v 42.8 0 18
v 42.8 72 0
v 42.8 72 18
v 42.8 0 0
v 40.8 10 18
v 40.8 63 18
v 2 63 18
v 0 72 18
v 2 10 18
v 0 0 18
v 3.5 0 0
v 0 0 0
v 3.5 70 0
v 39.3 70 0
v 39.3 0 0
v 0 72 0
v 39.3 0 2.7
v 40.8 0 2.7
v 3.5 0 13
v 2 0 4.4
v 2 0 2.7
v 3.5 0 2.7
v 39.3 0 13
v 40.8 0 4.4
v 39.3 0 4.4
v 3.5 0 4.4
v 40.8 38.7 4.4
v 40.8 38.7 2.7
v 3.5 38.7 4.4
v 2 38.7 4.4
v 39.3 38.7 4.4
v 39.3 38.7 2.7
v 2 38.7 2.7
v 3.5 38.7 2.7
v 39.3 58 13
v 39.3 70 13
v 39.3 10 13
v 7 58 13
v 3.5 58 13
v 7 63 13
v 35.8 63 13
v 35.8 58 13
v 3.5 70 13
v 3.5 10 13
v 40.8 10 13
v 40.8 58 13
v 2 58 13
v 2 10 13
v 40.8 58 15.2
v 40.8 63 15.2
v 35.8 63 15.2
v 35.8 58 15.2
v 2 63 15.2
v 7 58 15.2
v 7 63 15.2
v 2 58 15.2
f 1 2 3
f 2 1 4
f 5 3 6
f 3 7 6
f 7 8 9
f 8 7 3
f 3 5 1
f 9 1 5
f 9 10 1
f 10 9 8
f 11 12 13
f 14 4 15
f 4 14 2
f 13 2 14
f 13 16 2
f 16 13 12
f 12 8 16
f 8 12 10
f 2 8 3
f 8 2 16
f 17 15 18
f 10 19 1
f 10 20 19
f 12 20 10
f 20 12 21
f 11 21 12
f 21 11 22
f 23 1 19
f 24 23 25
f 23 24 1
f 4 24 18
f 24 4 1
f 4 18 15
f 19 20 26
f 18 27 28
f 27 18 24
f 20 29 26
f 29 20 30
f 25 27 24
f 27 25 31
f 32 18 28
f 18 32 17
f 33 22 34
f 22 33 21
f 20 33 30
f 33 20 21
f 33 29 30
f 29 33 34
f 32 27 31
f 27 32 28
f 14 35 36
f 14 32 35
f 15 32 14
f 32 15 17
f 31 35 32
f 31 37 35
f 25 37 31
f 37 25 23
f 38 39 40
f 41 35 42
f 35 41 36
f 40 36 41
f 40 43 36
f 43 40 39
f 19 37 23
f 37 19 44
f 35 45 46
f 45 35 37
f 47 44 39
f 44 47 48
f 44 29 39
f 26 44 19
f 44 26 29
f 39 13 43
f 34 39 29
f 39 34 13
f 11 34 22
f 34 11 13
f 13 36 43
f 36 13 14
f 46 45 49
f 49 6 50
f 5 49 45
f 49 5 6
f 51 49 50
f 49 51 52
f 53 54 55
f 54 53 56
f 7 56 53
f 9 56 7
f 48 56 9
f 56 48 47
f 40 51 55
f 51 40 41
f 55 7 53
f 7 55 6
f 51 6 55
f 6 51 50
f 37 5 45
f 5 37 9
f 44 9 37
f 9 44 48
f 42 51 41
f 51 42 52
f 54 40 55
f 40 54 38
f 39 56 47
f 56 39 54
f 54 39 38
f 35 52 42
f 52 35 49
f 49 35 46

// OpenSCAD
bodyWidth = 130;
bodyDepth = 80;
bodyHeight = 40;

shellThickness = 4;
glassThickness = 2.1;

inlayHeight = 18;

module bottom() {
  borderThickness = 1.5;
  difference() {
    cube([bodyWidth, bodyDepth, bodyHeight]);
    // upper clearance
    translate([shellThickness,
            shellThickness,
            bodyHeight-(2*glassThickness+inlayHeight)]) {
      cube([
        bodyWidth-2*shellThickness,
        bodyDepth-2*shellThickness,
        2*glassThickness+inlayHeight]);
    };
    // lower clearance
    translate([shellThickness+borderThickness,
            shellThickness+borderThickness,
            shellThickness]) {
      cube([
        bodyWidth-2*shellThickness-2*borderThickness,
        bodyDepth-2*shellThickness-2*borderThickness,
        bodyHeight-(shellThickness+2*glassThickness+inlayHeight)]);
    };
  };
}

module bridge() {
  translate([
    bodyWidth/2-.5*shellThickness,
    shellThickness,
    shellThickness]) {
      cube([
        shellThickness,
        bodyDepth-2*shellThickness,
        bodyHeight-shellThickness-2*glassThickness]);
  };
}

module body() {
  difference() {
    bottom();
    // Nut für Glasscheibe
    translate([
        shellThickness/2,
        shellThickness/2,
        bodyHeight-2*glassThickness
    ]) {
      cube([
        bodyWidth-shellThickness,
        bodyDepth,
        glassThickness
        ]);
    };
  };
  bridge();
}

module displayHolder(width, depth, height, wallThickness) {
    // Leiterplatte 38,8 mm x 28,7 mm x 1,7 mm
    pcbWidth = 38.8;
    pcbDepth = 28.7;
    pcbHeight = 1.7;
    pinHeaderHeightFemale = 8.3;
    pinHeaderHeightMale = 2.5;
    displayHeight = 2.8;
    distancePcbToBorder = 10.0;
    distanceHeaderSide = 1.5;
    displayButtonsDepth = 53;
    headerGap = 0.3;

  // height of pcb over bottom line
  h1 = height-(displayHeight+pinHeaderHeightMale+pinHeaderHeightFemale+pcbHeight);

  difference() {
    cube([width,depth,height]);
    // pcb rails
    translate([wallThickness,0,h1]) {
      cube([pcbWidth,pcbDepth+distancePcbToBorder, pcbHeight]);
    };
    // pcb header space
    translate([wallThickness+distanceHeaderSide,0,0]) {
      cube([pcbWidth-(2*distanceHeaderSide),
        depth-wallThickness,
        h1+pcbHeight+pinHeaderHeightFemale+headerGap]);
    };
    // display space
    translate([wallThickness,distancePcbToBorder,height-displayHeight]) {
      cube([pcbWidth,
        displayButtonsDepth,
        displayHeight]);
    };
    // pcb display space
    translate([wallThickness+5,
    distancePcbToBorder,
    h1+pcbHeight+pinHeaderHeightFemale+headerGap]) {
      cube([pcbWidth-10,
        displayButtonsDepth,
        pinHeaderHeightMale-headerGap]);
    };
    translate([wallThickness,
    distancePcbToBorder,
    h1+pcbHeight+pinHeaderHeightFemale+headerGap]) {
      cube([pcbWidth,
        displayButtonsDepth-5,
        pinHeaderHeightMale-headerGap]);
    };
  };
};

module inlay() {
  width = bodyWidth-2*shellThickness;
  depth = bodyDepth-2*shellThickness;
  height = inlayHeight;
  wallThickness = 2;
  holderWidth = 38.8+2*wallThickness;
    
  difference() {
    // body
    cube([width,depth,height]);
    //// remove inner body
    //translate([wallThickness,wallThickness,0]) {
    //  cube([
    //    width-2*wallThickness,
    //    depth-2*wallThickness,
    //    height-wallThickness]);
    //};
    // remove inner body
    translate([2*wallThickness,0,0]) {
      cube([
        width-2*2*wallThickness,
        depth,
        height-wallThickness]);
    };
    // remove inner body
    translate([0,2*wallThickness,0]) {
      cube([
        width,
        depth-2*2*wallThickness,
        height-wallThickness]);
    };
    // make space for display holder
    translate([(width-holderWidth)/2,0,0]) {
      cube([
        holderWidth,
        depth,
        height]);
    };
  };
  // insert display holder
  translate([(width-holderWidth)/2,0,0]) {
    displayHolder(holderWidth, depth, height, wallThickness);
  };
}

module onlyDisplayHolder() {
  width = bodyWidth-2*shellThickness;
  depth = bodyDepth-2*shellThickness;
  height = inlayHeight;
  wallThickness = 2;
  holderWidth = 38.8+2*wallThickness;
  displayHolder(holderWidth, depth, height, wallThickness);    
}

//body();
//inlay();
onlyDisplayHolder();
